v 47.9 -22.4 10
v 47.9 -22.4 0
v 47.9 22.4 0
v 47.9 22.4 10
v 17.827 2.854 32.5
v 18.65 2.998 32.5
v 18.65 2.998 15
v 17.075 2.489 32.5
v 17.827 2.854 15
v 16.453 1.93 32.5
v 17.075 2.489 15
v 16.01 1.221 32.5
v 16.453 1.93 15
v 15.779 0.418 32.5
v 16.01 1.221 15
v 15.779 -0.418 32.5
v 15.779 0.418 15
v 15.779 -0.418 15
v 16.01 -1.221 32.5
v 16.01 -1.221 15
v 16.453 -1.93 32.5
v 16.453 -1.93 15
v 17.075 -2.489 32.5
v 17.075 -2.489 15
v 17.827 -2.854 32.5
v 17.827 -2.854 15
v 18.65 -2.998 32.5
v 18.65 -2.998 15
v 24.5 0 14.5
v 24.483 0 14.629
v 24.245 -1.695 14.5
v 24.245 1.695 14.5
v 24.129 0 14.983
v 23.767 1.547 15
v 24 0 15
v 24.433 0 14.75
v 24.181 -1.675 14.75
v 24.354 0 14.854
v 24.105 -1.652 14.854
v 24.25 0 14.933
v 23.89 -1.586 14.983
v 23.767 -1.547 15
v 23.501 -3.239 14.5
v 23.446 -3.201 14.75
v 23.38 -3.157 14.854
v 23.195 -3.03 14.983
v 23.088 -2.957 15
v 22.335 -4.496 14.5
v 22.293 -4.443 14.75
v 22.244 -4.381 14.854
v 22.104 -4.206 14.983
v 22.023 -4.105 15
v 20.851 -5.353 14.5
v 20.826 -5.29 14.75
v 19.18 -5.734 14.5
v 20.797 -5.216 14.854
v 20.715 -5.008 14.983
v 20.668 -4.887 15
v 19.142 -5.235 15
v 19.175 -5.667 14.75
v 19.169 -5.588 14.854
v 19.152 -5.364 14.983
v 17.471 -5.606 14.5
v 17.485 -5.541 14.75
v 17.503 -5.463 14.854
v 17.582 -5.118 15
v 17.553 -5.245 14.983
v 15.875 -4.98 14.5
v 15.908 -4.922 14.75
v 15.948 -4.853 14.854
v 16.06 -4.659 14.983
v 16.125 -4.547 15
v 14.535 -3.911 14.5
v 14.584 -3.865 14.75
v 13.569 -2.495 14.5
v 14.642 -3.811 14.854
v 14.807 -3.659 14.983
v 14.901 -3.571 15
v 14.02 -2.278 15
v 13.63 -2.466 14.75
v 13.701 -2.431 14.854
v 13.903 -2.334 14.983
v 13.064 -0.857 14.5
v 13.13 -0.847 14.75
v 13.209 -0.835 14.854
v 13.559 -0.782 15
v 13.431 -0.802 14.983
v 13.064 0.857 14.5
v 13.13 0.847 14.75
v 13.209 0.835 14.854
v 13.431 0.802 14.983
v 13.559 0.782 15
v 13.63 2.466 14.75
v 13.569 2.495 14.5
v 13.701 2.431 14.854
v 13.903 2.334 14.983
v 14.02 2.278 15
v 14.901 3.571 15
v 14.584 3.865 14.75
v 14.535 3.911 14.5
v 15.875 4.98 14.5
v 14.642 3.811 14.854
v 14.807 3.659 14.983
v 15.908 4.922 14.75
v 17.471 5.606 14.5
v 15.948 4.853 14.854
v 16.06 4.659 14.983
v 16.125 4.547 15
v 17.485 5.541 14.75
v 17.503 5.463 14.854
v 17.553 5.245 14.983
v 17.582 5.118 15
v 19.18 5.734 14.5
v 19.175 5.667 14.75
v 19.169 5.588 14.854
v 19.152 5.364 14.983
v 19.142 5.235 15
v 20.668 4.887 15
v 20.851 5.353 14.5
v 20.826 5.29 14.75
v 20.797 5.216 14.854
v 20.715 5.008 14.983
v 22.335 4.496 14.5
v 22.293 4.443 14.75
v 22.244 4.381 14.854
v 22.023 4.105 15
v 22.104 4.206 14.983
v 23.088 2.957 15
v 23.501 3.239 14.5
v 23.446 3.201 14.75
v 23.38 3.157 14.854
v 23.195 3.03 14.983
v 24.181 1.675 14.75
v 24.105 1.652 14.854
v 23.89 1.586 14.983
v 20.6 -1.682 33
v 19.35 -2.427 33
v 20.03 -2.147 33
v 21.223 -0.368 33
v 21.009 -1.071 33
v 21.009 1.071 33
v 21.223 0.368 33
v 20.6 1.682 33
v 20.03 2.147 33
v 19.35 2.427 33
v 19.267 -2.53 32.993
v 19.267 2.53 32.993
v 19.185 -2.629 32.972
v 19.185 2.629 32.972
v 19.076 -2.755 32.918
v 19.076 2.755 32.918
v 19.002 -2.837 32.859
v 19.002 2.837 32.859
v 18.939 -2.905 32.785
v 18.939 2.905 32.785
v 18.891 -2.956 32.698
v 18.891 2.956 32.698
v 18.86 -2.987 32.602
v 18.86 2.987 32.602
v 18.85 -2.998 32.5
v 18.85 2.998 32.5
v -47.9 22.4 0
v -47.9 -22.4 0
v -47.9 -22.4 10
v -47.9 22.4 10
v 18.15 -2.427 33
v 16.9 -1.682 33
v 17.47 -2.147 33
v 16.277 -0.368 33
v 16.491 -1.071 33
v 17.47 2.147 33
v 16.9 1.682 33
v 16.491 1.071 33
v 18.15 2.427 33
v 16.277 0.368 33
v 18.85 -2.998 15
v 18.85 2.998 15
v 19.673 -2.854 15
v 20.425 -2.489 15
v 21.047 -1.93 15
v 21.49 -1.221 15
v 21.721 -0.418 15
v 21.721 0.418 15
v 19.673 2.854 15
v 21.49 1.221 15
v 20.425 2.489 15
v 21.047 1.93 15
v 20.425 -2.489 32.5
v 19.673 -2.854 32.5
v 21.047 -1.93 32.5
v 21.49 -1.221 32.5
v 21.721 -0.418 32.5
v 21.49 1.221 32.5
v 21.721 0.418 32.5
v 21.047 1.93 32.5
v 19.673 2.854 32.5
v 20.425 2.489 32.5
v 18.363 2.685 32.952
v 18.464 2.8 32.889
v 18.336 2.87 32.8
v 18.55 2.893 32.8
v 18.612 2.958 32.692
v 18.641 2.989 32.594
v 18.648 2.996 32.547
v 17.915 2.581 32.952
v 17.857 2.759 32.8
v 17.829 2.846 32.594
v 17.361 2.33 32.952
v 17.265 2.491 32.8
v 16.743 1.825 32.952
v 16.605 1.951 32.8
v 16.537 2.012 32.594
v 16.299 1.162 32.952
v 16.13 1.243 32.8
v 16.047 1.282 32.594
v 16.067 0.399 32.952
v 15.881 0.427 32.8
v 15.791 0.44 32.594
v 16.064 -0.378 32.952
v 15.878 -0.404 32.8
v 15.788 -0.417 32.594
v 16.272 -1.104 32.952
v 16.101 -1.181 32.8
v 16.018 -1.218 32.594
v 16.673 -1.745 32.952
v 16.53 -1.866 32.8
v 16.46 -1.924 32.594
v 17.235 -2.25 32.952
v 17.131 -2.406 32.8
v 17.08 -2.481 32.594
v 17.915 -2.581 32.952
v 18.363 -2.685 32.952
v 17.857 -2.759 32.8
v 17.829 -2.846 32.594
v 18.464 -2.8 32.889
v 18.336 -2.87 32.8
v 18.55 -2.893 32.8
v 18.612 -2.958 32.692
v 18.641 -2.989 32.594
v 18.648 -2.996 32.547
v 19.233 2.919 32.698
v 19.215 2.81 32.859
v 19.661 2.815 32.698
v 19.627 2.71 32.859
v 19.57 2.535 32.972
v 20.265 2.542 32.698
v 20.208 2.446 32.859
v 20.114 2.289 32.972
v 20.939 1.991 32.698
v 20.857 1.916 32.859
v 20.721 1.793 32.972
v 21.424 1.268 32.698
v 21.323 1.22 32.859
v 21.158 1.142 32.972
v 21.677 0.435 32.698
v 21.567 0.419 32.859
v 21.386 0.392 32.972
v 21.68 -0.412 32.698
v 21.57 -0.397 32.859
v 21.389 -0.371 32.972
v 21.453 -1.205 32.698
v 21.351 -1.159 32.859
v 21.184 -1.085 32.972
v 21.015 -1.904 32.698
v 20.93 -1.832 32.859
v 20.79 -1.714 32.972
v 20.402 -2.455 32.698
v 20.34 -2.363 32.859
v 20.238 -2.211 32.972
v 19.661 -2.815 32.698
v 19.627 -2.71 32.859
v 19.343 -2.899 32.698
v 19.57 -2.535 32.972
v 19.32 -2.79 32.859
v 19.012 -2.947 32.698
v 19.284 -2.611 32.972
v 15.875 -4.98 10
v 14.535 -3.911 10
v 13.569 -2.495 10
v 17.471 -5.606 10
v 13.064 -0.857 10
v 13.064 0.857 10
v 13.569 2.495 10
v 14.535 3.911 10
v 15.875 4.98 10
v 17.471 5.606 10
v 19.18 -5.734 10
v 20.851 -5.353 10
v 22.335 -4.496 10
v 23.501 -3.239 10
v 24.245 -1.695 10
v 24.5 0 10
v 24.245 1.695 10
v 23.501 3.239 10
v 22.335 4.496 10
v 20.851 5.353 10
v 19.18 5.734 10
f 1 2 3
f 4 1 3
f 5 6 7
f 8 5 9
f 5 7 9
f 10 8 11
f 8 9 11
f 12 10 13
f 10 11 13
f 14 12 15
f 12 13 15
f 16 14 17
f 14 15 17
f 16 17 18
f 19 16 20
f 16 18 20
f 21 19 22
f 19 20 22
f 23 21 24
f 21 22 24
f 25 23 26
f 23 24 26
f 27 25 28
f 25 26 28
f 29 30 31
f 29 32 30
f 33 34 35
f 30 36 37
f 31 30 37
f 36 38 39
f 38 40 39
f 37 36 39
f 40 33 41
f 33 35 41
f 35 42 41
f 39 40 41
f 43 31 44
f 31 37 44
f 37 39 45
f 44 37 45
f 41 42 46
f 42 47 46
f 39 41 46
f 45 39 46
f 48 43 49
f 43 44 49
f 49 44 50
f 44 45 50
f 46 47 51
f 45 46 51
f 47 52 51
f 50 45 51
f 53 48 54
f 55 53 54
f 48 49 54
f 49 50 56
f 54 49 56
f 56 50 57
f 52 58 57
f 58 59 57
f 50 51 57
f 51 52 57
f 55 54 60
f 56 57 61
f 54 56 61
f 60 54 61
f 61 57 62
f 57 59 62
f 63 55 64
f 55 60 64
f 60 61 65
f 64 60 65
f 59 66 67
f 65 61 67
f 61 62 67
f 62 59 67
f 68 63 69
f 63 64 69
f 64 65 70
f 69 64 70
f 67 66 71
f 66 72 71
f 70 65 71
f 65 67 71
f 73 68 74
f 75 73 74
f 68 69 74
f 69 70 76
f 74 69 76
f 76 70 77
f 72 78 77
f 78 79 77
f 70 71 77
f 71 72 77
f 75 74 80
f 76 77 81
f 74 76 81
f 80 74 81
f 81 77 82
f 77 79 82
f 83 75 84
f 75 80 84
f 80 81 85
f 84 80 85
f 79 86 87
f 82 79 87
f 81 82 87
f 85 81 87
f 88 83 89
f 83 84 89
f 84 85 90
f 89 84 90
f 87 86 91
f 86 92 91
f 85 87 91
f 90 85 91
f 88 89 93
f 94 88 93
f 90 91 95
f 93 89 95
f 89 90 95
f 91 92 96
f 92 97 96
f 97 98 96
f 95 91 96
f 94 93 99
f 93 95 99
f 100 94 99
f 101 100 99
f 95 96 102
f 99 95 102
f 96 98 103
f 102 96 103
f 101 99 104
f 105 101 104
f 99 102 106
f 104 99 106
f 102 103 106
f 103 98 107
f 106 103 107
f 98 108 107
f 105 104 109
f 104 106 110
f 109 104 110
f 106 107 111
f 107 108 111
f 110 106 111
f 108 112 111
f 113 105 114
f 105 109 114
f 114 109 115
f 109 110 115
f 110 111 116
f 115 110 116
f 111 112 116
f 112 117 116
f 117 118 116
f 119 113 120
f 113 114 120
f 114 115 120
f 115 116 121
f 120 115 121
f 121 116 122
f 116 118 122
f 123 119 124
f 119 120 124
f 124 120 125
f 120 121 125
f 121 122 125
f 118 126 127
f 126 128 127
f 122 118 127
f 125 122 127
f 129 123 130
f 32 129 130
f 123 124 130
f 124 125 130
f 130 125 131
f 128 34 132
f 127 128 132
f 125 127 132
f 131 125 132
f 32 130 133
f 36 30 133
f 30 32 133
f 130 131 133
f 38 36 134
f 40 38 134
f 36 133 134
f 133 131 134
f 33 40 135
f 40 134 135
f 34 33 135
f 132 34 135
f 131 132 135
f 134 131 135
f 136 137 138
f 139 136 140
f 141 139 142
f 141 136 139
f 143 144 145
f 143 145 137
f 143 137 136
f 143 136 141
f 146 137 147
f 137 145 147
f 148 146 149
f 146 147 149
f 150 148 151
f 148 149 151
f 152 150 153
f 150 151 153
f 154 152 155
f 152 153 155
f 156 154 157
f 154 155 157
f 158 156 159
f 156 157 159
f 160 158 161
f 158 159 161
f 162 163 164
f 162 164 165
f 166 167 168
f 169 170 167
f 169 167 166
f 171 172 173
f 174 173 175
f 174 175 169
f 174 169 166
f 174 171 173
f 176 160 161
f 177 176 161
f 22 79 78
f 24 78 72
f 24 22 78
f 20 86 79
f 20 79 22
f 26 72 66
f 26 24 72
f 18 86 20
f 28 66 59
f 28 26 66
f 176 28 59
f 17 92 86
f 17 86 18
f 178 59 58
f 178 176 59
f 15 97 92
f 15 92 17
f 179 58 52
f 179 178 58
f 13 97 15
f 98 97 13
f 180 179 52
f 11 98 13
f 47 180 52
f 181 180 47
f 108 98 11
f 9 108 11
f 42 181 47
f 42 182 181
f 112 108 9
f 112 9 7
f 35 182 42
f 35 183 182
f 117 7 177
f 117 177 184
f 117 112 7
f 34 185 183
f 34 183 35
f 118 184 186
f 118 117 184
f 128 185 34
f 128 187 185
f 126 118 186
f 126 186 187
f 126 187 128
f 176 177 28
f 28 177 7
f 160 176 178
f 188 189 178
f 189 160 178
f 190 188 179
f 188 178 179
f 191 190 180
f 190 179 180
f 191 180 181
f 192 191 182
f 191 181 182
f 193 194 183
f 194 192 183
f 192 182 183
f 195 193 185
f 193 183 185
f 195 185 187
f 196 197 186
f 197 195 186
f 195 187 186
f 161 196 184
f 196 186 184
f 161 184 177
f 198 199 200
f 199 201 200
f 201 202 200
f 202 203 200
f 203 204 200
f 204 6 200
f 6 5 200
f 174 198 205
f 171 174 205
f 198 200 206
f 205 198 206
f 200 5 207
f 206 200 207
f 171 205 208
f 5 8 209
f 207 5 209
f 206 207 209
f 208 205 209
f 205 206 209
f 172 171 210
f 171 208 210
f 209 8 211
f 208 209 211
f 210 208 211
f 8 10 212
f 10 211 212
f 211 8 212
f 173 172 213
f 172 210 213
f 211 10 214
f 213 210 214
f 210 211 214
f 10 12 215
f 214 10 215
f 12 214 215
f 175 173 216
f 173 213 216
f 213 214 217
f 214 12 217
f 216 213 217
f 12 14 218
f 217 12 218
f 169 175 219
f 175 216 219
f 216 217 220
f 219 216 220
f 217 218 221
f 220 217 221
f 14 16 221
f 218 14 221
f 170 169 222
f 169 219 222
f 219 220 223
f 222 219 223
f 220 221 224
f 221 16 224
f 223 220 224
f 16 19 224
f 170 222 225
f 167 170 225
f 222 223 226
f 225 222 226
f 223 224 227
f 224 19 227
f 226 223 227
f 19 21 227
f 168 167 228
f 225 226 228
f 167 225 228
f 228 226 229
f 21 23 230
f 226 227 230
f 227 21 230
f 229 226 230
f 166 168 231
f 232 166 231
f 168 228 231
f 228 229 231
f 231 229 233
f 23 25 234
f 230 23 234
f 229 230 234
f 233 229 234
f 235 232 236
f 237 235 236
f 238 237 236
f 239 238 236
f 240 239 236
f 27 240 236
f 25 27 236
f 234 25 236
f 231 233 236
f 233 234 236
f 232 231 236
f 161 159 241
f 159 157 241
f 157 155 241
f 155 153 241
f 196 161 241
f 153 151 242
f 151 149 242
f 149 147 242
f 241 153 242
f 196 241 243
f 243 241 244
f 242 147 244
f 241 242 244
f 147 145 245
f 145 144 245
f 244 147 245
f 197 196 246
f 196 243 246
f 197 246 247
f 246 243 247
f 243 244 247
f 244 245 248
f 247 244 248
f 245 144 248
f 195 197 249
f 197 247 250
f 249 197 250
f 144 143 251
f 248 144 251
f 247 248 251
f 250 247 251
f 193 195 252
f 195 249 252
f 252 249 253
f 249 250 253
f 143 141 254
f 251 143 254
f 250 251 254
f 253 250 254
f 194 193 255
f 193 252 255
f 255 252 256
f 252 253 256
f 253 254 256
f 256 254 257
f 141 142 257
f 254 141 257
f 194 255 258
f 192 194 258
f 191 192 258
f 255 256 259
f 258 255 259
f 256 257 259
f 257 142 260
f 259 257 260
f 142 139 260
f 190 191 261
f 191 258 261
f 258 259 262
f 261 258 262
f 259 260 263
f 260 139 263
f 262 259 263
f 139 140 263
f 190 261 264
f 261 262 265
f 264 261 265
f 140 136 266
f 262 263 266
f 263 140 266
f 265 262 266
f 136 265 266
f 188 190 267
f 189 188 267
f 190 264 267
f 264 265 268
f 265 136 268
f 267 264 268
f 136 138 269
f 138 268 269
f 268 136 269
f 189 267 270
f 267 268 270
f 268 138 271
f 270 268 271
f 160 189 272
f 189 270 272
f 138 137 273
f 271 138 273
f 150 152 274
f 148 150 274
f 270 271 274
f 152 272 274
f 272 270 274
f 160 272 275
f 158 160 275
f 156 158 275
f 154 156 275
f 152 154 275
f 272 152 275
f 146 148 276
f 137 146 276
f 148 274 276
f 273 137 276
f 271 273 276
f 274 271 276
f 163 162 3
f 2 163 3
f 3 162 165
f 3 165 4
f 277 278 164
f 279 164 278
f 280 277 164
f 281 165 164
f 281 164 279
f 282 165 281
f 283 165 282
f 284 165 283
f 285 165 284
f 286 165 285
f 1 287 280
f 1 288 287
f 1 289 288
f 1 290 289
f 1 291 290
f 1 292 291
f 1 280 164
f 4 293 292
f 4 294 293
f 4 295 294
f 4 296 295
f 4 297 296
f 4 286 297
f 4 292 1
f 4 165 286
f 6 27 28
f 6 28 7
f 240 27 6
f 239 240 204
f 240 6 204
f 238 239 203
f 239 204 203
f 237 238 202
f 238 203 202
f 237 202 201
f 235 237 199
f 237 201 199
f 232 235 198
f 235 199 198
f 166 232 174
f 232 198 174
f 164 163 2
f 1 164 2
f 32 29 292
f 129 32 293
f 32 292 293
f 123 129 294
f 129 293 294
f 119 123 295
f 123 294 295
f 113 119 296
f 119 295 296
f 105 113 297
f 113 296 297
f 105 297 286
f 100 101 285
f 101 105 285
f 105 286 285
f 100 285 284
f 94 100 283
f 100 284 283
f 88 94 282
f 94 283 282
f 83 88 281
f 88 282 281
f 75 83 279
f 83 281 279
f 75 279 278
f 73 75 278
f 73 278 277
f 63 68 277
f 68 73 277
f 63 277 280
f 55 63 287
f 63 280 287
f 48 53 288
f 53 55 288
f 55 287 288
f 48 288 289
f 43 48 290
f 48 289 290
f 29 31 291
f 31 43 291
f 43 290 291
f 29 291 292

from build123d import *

# Parameters (mm, degrees)
SKETCH1_W              = 95.8
SKETCH1_H              = 44.8
MAINWALL_DEPTH         = 10
SKETCH2_R              = 3
SPRINGAXLE_DEPTH       = 23
SKETCH3_R              = 5.75
SPOOLSUPPORTAXLE_DEPTH = 5
SKETCH4_W              = 0.2
SKETCH4_H              = 20
SLICE_2_DEPTH          = 18
FILLET1_R              = 0.5


with BuildPart() as part:
    # Sketch1 → MainWall (new body)
    with BuildSketch(Plane.XY):
        Rectangle(SKETCH1_W, SKETCH1_H)
    extrude(amount=MAINWALL_DEPTH)

    # Sketch2 → SpringAxle (add)
    with BuildSketch(Plane.XY.offset(10)):
        with Locations((18.75, 0)):
            Circle(SKETCH2_R)
    extrude(amount=SPRINGAXLE_DEPTH)

    # Sketch3 → SpoolSupportAxle (add)
    with BuildSketch(Plane.XY.offset(10)):
        with Locations((18.75, 0)):
            Circle(SKETCH3_R)
    extrude(amount=SPOOLSUPPORTAXLE_DEPTH)

    # Sketch4 → Slice 2 (cut)
    with BuildSketch(Plane.XY.offset(33)):
        with Locations((18.75, 0)):
            Rectangle(SKETCH4_W, SKETCH4_H)
    extrude(amount=-SLICE_2_DEPTH, mode=Mode.SUBTRACT)

    # Fillet1
    fillet1_edges = [part.edges().sort_by_distance(p)[0] for p in [
        (13, 0, 15),
        (15.75, 0, 33),
        (21.75, 0, 33),
        (18.85, 0, 33),
        (18.65, 0, 33),
    ]]
    fillet(fillet1_edges, radius=FILLET1_R)


solid = part.part
